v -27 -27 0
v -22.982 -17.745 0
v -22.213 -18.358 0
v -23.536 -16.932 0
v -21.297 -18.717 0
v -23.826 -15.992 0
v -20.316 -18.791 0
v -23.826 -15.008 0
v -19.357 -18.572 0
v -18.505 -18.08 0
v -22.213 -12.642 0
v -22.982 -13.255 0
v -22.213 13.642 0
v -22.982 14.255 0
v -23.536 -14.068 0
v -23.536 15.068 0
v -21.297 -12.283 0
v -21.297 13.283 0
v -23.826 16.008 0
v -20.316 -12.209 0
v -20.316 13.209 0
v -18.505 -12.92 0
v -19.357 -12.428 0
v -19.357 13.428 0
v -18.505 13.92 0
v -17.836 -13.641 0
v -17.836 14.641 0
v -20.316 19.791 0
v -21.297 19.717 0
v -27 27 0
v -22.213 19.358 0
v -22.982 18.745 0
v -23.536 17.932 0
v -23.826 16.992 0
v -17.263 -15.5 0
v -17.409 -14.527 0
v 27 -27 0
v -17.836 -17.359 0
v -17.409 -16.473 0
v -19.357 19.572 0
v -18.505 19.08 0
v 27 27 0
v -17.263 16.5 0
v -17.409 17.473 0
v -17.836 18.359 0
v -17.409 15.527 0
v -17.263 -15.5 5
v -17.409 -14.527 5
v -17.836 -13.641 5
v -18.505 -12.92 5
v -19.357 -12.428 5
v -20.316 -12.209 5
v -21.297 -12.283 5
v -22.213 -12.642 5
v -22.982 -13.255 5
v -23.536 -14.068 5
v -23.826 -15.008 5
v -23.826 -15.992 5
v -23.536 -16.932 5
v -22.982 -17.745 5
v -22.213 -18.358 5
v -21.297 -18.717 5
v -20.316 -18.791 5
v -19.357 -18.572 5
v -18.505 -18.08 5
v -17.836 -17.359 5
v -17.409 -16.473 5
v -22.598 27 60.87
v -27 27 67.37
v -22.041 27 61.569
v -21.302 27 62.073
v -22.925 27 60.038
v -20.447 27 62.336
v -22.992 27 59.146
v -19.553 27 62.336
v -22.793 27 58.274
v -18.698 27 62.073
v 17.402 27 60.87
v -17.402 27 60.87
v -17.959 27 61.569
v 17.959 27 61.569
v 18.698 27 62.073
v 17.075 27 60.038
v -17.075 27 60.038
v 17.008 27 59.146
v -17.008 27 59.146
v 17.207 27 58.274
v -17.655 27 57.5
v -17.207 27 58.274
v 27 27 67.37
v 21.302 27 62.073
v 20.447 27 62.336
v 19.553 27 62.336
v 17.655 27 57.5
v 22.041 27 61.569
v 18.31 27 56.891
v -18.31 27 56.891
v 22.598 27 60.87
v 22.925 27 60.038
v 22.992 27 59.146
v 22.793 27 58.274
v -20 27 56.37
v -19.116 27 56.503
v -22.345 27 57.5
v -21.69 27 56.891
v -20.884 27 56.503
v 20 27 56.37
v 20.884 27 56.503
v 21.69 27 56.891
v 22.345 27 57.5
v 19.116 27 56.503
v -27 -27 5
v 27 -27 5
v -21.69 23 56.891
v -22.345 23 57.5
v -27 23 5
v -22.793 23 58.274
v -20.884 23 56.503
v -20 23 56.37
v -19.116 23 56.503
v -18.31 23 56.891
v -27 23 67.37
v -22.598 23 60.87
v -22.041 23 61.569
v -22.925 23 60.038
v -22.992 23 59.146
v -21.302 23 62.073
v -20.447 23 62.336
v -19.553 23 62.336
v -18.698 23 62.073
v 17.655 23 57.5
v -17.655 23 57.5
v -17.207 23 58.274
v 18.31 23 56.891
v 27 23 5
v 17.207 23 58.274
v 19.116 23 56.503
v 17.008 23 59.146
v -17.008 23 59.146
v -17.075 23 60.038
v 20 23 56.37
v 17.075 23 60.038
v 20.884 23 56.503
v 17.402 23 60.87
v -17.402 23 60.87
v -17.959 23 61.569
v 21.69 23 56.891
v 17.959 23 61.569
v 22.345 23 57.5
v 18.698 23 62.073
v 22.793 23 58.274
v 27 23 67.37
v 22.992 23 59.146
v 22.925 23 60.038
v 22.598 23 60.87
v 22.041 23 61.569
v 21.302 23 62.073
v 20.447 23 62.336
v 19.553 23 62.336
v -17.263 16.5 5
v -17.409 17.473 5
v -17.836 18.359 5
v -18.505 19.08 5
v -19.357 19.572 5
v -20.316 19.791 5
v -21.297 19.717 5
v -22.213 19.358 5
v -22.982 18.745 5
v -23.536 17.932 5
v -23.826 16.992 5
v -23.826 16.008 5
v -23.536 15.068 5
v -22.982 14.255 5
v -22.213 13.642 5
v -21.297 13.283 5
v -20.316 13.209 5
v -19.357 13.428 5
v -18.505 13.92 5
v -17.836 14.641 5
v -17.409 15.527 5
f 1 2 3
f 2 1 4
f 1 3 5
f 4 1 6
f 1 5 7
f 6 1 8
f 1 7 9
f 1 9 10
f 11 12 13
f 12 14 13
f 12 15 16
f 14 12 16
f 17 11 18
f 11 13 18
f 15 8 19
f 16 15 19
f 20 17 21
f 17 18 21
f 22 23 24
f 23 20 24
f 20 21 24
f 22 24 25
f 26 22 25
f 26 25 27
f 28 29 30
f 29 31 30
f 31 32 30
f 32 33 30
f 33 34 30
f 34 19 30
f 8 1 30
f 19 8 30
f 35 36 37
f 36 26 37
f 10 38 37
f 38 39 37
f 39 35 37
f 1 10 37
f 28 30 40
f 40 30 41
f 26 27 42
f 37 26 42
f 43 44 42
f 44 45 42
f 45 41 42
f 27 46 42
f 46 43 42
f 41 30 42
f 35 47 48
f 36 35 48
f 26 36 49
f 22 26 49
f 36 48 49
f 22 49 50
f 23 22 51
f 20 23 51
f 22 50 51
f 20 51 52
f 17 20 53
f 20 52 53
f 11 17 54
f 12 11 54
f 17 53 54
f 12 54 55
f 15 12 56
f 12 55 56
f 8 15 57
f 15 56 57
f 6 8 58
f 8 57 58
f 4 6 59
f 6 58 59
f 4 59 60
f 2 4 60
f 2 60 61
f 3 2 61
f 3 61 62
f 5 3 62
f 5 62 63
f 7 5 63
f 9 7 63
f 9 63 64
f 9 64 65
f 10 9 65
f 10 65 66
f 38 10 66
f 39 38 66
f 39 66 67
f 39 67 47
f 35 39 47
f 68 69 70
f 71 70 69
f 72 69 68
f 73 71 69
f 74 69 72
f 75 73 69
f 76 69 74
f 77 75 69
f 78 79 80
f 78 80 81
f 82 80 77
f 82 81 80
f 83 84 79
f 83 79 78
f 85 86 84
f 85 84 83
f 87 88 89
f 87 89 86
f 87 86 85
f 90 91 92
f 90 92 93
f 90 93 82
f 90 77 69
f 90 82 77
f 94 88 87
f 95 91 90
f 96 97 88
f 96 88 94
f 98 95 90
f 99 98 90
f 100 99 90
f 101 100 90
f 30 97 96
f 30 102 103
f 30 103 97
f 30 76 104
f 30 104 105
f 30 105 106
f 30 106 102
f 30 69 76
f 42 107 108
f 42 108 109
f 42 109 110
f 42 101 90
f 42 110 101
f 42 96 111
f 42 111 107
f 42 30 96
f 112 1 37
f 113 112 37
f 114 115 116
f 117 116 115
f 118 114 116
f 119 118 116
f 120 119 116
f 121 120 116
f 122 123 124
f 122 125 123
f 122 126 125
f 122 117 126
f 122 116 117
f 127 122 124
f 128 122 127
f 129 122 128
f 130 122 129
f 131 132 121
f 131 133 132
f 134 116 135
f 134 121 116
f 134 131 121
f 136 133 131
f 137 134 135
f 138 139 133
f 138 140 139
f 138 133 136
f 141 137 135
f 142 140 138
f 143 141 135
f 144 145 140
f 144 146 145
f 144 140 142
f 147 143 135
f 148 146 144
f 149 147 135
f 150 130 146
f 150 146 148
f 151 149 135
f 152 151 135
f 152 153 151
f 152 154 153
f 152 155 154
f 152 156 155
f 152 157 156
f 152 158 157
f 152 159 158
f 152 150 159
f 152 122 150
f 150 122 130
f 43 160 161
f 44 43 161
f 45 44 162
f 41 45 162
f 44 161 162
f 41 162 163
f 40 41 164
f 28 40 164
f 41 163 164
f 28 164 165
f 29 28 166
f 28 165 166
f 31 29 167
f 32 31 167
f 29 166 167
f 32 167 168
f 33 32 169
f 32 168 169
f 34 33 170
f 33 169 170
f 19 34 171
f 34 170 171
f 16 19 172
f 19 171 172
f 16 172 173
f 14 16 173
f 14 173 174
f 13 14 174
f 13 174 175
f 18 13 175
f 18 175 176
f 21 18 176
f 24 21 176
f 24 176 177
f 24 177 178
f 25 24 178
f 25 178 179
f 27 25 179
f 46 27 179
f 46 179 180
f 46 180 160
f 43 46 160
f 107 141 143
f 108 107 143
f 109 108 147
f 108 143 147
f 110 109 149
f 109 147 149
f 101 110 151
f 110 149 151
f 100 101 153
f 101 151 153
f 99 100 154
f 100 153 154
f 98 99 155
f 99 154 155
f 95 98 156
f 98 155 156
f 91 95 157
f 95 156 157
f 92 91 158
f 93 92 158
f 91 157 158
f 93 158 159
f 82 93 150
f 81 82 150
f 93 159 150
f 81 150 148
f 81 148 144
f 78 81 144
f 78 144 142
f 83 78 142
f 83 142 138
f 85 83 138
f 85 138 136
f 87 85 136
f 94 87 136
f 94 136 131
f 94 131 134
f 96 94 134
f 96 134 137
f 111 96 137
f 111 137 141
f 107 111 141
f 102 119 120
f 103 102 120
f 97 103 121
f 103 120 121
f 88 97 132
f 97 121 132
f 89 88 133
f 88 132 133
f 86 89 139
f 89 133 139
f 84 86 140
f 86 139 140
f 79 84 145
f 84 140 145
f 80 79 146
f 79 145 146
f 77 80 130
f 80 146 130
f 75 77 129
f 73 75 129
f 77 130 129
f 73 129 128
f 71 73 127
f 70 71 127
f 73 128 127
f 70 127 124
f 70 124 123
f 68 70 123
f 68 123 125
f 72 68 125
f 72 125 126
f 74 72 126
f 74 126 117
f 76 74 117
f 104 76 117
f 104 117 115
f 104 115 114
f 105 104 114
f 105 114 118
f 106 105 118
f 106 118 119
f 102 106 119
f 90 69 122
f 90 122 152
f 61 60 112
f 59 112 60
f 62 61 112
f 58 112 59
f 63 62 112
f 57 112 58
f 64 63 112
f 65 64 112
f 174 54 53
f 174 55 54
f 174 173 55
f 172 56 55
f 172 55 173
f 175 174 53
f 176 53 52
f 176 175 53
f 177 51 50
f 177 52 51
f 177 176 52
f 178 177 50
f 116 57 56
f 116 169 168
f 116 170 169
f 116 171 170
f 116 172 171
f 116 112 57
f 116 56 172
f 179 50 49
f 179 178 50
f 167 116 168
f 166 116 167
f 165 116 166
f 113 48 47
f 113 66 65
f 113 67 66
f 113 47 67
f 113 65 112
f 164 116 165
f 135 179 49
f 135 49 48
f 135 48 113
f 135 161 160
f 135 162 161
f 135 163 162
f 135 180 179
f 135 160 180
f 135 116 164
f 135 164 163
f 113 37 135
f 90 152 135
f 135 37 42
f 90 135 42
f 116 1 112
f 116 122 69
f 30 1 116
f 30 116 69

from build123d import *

# Parameters (mm, degrees)
ESQUISSE1_W             = 54
ESQUISSE1_H             = 54
BOSS_EXTRU_1_DEPTH      = 67.37
ESQUISSE2_W             = 85.887974464
ESQUISSE2_H             = 58.790343592
ENL_V_MAT_EXTRU_1_DEPTH = 62.37
ESQUISSE3_R             = 3
ENL_V_MAT_EXTRU_2_DEPTH = 62.37
D_GAGEMENT_M61_D        = 6.6


with BuildPart() as part:
    # Esquisse1 → Boss.-Extru.1 (new body)
    with BuildSketch(Plane.XY):
        Rectangle(ESQUISSE1_W, ESQUISSE1_H)
    extrude(amount=BOSS_EXTRU_1_DEPTH)

    # Esquisse2 → Enlèv. mat.-Extru.1 (cut)
    with BuildSketch(Plane.XY.offset(67.37)):
        with Locations((-4.168944697, -6.395171796)):
            Rectangle(ESQUISSE2_W, ESQUISSE2_H)
    extrude(amount=-ENL_V_MAT_EXTRU_1_DEPTH, mode=Mode.SUBTRACT)

    # Esquisse3 → Enlèv. mat.-Extru.2 (cut)
    with BuildSketch(Plane.XZ.offset(-23)):
        with Locations(Location((-20, 59.37, 0), (0, 0, 270))):
            Circle(ESQUISSE3_R)
        with Locations(Location((20, 59.37, 0), (0, 0, 270))):
            Circle(ESQUISSE3_R)
    extrude(amount=-ENL_V_MAT_EXTRU_2_DEPTH, mode=Mode.SUBTRACT)

    # Dégagement M61 (through all)
    with Locations(Plane(origin=(0, 0, 0), x_dir=(-1, 0, 0), z_dir=(0, 0, -1))):
        with Locations((20.562817304, -15.5), (20.562817304, 16.5)):
            Hole(D_GAGEMENT_M61_D / 2)


solid = part.part
